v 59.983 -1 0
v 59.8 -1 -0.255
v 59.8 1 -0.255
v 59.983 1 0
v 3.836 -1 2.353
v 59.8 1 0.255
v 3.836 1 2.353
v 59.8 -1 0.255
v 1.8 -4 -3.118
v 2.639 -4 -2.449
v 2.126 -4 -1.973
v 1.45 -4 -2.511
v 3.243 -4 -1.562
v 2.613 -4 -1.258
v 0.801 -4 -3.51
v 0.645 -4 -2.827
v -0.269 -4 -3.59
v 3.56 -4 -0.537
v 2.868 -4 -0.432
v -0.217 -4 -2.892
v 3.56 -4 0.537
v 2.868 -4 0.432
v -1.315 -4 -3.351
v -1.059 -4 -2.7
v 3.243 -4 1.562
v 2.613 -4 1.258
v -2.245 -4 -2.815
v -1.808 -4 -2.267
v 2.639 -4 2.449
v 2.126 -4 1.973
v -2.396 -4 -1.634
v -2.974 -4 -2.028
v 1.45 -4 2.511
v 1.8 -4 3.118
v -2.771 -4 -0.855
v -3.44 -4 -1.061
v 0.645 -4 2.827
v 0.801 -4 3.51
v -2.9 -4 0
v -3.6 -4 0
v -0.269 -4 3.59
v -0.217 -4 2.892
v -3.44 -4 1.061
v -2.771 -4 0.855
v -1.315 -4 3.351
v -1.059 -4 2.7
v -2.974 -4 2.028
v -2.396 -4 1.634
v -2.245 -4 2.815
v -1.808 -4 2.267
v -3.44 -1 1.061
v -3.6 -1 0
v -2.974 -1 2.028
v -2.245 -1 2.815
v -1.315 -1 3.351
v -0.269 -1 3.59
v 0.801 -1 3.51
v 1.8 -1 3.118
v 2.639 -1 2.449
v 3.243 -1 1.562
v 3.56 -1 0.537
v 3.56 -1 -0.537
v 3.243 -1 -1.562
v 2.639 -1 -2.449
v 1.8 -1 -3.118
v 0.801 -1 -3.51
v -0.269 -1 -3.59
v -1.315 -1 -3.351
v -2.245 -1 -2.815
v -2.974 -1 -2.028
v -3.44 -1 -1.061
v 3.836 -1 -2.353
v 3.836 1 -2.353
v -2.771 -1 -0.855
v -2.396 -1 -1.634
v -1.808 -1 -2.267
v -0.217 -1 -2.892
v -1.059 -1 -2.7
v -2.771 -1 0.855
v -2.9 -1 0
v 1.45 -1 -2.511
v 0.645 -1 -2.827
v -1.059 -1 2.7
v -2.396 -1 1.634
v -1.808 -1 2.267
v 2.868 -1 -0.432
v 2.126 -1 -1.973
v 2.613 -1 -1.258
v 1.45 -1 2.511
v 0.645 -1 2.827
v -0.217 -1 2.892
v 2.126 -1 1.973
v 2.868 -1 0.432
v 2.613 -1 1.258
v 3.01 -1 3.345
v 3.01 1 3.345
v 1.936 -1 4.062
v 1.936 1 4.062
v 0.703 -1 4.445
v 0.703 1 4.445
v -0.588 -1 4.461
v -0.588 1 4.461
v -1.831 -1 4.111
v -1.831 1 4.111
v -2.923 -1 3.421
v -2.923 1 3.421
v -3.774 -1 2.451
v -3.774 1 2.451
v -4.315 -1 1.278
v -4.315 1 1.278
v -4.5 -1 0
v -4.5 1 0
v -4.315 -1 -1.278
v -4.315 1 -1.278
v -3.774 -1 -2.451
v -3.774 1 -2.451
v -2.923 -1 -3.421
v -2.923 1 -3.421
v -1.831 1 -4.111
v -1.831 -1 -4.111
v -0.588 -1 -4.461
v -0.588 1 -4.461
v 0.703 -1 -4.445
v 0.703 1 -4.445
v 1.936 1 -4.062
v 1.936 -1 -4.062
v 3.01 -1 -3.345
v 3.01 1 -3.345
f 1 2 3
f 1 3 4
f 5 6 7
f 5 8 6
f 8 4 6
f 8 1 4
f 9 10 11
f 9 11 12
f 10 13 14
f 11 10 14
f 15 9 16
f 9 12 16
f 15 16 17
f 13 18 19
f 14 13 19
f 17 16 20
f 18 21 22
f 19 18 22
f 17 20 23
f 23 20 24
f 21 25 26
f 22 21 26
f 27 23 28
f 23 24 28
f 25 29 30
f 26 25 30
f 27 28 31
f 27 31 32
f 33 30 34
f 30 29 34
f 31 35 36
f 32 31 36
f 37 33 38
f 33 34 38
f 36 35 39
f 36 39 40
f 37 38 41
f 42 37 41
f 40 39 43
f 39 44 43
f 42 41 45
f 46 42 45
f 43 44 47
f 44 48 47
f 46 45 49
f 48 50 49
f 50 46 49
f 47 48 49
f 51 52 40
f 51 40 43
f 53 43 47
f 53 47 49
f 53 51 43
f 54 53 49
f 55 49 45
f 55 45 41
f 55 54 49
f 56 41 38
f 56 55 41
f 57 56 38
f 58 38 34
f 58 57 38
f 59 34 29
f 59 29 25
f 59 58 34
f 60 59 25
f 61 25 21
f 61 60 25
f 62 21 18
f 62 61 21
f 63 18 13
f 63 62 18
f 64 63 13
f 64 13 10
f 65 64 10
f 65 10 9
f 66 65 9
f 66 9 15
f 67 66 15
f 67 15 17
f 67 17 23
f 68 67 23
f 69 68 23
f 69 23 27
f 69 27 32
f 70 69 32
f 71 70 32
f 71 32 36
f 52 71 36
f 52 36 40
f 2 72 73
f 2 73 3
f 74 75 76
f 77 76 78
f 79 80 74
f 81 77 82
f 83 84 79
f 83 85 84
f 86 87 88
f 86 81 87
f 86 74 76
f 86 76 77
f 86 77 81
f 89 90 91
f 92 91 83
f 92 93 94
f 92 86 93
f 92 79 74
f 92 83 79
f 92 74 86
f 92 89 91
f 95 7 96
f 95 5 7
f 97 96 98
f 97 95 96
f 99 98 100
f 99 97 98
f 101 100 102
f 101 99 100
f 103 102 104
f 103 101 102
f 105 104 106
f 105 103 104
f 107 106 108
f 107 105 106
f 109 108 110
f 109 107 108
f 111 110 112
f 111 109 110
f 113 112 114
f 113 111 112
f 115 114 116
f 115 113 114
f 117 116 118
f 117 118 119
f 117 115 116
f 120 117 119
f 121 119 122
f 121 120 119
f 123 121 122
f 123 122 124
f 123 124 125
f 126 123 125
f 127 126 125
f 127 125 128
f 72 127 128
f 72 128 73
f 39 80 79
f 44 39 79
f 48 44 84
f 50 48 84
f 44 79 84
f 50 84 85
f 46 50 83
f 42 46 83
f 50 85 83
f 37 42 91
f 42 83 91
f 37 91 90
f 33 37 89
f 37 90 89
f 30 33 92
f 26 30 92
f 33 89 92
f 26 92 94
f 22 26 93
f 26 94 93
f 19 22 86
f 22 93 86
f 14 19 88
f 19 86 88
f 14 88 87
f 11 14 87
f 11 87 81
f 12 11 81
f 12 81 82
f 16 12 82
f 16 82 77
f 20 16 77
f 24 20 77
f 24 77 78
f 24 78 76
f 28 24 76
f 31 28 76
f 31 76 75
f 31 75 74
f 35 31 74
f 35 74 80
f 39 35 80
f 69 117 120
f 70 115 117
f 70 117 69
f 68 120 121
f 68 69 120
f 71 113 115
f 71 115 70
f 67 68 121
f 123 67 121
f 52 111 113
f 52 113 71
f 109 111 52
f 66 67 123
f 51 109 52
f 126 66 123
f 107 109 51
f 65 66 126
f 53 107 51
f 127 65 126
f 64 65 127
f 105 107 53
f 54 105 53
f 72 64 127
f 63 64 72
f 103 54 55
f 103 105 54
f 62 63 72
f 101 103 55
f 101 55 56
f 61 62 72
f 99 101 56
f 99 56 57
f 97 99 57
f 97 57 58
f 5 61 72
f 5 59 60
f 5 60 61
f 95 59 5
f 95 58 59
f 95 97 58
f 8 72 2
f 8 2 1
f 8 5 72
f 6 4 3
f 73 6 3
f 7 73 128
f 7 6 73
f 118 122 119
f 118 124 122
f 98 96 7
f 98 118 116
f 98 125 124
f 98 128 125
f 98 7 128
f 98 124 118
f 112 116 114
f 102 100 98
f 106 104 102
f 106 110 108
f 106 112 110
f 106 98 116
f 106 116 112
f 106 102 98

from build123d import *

# Parameters (mm, degrees)
F1_DEPTH = 1
F2_R     = 3.6
F2_R_2   = 2.9
F3_DEPTH = 5
F4_DEPTH = 1


with BuildPart() as f1:
    # F0 (on Front) → F1 (new body, symmetric)
    with BuildSketch(Plane.XZ):
        with BuildLine():
            ThreePointArc((3.8359832735, -2.3527074457), (4.3308154389, -1.2223083222), (4.5, 0))
            ThreePointArc((4.5, 0), (4.3308154389, 1.2223083222), (3.8359832735, 2.3527074457))
            ThreePointArc((3.8359832735, 2.3527074457), (-4.5, 0), (3.8359832735, -2.3527074457))
        make_face()
        with BuildLine():
            ThreePointArc((3.8359832735, 2.3527074457), (4.3308154389, 1.2223083222), (4.5, 0))
            ThreePointArc((4.5, 0), (4.3308154389, -1.2223083222), (3.8359832735, -2.3527074457))
            Line((3.8359832735, -2.3527074457), (59.7996972501, -0.2551520593))
            Line((59.7996972501, -0.2551520593), (59.9825401634, -9.9e-09))
            Line((59.9825401634, -9.9e-09), (59.7996972501, 0.2551520395))
            Line((59.7996972501, 0.2551520395), (3.8359832735, 2.3527074457))
        make_face()
    extrude(amount=F1_DEPTH, both=True)

    # F2 (on face) → F3 (join)
    with BuildSketch(Plane(origin=(0, 1, 0), x_dir=(-1, 0, 0), z_dir=(0, 1, 0))):
        Circle(F2_R)
        Circle(F2_R_2, mode=Mode.SUBTRACT)
    extrude(amount=-F3_DEPTH)

    # F0 (on Front) → F4 (join, symmetric)
    with BuildSketch(Plane.XZ):
        with BuildLine():
            ThreePointArc((3.8359832735, 2.3527074457), (4.3308154389, 1.2223083222), (4.5, 0))
            ThreePointArc((4.5, 0), (4.3308154389, -1.2223083222), (3.8359832735, -2.3527074457))
            Line((3.8359832735, -2.3527074457), (59.7996972501, -0.2551520593))
            Line((59.7996972501, -0.2551520593), (59.9825401634, -9.9e-09))
            Line((59.9825401634, -9.9e-09), (59.7996972501, 0.2551520395))
            Line((59.7996972501, 0.2551520395), (3.8359832735, 2.3527074457))
        make_face()
    extrude(amount=F4_DEPTH, both=True)


solid = f1.part
